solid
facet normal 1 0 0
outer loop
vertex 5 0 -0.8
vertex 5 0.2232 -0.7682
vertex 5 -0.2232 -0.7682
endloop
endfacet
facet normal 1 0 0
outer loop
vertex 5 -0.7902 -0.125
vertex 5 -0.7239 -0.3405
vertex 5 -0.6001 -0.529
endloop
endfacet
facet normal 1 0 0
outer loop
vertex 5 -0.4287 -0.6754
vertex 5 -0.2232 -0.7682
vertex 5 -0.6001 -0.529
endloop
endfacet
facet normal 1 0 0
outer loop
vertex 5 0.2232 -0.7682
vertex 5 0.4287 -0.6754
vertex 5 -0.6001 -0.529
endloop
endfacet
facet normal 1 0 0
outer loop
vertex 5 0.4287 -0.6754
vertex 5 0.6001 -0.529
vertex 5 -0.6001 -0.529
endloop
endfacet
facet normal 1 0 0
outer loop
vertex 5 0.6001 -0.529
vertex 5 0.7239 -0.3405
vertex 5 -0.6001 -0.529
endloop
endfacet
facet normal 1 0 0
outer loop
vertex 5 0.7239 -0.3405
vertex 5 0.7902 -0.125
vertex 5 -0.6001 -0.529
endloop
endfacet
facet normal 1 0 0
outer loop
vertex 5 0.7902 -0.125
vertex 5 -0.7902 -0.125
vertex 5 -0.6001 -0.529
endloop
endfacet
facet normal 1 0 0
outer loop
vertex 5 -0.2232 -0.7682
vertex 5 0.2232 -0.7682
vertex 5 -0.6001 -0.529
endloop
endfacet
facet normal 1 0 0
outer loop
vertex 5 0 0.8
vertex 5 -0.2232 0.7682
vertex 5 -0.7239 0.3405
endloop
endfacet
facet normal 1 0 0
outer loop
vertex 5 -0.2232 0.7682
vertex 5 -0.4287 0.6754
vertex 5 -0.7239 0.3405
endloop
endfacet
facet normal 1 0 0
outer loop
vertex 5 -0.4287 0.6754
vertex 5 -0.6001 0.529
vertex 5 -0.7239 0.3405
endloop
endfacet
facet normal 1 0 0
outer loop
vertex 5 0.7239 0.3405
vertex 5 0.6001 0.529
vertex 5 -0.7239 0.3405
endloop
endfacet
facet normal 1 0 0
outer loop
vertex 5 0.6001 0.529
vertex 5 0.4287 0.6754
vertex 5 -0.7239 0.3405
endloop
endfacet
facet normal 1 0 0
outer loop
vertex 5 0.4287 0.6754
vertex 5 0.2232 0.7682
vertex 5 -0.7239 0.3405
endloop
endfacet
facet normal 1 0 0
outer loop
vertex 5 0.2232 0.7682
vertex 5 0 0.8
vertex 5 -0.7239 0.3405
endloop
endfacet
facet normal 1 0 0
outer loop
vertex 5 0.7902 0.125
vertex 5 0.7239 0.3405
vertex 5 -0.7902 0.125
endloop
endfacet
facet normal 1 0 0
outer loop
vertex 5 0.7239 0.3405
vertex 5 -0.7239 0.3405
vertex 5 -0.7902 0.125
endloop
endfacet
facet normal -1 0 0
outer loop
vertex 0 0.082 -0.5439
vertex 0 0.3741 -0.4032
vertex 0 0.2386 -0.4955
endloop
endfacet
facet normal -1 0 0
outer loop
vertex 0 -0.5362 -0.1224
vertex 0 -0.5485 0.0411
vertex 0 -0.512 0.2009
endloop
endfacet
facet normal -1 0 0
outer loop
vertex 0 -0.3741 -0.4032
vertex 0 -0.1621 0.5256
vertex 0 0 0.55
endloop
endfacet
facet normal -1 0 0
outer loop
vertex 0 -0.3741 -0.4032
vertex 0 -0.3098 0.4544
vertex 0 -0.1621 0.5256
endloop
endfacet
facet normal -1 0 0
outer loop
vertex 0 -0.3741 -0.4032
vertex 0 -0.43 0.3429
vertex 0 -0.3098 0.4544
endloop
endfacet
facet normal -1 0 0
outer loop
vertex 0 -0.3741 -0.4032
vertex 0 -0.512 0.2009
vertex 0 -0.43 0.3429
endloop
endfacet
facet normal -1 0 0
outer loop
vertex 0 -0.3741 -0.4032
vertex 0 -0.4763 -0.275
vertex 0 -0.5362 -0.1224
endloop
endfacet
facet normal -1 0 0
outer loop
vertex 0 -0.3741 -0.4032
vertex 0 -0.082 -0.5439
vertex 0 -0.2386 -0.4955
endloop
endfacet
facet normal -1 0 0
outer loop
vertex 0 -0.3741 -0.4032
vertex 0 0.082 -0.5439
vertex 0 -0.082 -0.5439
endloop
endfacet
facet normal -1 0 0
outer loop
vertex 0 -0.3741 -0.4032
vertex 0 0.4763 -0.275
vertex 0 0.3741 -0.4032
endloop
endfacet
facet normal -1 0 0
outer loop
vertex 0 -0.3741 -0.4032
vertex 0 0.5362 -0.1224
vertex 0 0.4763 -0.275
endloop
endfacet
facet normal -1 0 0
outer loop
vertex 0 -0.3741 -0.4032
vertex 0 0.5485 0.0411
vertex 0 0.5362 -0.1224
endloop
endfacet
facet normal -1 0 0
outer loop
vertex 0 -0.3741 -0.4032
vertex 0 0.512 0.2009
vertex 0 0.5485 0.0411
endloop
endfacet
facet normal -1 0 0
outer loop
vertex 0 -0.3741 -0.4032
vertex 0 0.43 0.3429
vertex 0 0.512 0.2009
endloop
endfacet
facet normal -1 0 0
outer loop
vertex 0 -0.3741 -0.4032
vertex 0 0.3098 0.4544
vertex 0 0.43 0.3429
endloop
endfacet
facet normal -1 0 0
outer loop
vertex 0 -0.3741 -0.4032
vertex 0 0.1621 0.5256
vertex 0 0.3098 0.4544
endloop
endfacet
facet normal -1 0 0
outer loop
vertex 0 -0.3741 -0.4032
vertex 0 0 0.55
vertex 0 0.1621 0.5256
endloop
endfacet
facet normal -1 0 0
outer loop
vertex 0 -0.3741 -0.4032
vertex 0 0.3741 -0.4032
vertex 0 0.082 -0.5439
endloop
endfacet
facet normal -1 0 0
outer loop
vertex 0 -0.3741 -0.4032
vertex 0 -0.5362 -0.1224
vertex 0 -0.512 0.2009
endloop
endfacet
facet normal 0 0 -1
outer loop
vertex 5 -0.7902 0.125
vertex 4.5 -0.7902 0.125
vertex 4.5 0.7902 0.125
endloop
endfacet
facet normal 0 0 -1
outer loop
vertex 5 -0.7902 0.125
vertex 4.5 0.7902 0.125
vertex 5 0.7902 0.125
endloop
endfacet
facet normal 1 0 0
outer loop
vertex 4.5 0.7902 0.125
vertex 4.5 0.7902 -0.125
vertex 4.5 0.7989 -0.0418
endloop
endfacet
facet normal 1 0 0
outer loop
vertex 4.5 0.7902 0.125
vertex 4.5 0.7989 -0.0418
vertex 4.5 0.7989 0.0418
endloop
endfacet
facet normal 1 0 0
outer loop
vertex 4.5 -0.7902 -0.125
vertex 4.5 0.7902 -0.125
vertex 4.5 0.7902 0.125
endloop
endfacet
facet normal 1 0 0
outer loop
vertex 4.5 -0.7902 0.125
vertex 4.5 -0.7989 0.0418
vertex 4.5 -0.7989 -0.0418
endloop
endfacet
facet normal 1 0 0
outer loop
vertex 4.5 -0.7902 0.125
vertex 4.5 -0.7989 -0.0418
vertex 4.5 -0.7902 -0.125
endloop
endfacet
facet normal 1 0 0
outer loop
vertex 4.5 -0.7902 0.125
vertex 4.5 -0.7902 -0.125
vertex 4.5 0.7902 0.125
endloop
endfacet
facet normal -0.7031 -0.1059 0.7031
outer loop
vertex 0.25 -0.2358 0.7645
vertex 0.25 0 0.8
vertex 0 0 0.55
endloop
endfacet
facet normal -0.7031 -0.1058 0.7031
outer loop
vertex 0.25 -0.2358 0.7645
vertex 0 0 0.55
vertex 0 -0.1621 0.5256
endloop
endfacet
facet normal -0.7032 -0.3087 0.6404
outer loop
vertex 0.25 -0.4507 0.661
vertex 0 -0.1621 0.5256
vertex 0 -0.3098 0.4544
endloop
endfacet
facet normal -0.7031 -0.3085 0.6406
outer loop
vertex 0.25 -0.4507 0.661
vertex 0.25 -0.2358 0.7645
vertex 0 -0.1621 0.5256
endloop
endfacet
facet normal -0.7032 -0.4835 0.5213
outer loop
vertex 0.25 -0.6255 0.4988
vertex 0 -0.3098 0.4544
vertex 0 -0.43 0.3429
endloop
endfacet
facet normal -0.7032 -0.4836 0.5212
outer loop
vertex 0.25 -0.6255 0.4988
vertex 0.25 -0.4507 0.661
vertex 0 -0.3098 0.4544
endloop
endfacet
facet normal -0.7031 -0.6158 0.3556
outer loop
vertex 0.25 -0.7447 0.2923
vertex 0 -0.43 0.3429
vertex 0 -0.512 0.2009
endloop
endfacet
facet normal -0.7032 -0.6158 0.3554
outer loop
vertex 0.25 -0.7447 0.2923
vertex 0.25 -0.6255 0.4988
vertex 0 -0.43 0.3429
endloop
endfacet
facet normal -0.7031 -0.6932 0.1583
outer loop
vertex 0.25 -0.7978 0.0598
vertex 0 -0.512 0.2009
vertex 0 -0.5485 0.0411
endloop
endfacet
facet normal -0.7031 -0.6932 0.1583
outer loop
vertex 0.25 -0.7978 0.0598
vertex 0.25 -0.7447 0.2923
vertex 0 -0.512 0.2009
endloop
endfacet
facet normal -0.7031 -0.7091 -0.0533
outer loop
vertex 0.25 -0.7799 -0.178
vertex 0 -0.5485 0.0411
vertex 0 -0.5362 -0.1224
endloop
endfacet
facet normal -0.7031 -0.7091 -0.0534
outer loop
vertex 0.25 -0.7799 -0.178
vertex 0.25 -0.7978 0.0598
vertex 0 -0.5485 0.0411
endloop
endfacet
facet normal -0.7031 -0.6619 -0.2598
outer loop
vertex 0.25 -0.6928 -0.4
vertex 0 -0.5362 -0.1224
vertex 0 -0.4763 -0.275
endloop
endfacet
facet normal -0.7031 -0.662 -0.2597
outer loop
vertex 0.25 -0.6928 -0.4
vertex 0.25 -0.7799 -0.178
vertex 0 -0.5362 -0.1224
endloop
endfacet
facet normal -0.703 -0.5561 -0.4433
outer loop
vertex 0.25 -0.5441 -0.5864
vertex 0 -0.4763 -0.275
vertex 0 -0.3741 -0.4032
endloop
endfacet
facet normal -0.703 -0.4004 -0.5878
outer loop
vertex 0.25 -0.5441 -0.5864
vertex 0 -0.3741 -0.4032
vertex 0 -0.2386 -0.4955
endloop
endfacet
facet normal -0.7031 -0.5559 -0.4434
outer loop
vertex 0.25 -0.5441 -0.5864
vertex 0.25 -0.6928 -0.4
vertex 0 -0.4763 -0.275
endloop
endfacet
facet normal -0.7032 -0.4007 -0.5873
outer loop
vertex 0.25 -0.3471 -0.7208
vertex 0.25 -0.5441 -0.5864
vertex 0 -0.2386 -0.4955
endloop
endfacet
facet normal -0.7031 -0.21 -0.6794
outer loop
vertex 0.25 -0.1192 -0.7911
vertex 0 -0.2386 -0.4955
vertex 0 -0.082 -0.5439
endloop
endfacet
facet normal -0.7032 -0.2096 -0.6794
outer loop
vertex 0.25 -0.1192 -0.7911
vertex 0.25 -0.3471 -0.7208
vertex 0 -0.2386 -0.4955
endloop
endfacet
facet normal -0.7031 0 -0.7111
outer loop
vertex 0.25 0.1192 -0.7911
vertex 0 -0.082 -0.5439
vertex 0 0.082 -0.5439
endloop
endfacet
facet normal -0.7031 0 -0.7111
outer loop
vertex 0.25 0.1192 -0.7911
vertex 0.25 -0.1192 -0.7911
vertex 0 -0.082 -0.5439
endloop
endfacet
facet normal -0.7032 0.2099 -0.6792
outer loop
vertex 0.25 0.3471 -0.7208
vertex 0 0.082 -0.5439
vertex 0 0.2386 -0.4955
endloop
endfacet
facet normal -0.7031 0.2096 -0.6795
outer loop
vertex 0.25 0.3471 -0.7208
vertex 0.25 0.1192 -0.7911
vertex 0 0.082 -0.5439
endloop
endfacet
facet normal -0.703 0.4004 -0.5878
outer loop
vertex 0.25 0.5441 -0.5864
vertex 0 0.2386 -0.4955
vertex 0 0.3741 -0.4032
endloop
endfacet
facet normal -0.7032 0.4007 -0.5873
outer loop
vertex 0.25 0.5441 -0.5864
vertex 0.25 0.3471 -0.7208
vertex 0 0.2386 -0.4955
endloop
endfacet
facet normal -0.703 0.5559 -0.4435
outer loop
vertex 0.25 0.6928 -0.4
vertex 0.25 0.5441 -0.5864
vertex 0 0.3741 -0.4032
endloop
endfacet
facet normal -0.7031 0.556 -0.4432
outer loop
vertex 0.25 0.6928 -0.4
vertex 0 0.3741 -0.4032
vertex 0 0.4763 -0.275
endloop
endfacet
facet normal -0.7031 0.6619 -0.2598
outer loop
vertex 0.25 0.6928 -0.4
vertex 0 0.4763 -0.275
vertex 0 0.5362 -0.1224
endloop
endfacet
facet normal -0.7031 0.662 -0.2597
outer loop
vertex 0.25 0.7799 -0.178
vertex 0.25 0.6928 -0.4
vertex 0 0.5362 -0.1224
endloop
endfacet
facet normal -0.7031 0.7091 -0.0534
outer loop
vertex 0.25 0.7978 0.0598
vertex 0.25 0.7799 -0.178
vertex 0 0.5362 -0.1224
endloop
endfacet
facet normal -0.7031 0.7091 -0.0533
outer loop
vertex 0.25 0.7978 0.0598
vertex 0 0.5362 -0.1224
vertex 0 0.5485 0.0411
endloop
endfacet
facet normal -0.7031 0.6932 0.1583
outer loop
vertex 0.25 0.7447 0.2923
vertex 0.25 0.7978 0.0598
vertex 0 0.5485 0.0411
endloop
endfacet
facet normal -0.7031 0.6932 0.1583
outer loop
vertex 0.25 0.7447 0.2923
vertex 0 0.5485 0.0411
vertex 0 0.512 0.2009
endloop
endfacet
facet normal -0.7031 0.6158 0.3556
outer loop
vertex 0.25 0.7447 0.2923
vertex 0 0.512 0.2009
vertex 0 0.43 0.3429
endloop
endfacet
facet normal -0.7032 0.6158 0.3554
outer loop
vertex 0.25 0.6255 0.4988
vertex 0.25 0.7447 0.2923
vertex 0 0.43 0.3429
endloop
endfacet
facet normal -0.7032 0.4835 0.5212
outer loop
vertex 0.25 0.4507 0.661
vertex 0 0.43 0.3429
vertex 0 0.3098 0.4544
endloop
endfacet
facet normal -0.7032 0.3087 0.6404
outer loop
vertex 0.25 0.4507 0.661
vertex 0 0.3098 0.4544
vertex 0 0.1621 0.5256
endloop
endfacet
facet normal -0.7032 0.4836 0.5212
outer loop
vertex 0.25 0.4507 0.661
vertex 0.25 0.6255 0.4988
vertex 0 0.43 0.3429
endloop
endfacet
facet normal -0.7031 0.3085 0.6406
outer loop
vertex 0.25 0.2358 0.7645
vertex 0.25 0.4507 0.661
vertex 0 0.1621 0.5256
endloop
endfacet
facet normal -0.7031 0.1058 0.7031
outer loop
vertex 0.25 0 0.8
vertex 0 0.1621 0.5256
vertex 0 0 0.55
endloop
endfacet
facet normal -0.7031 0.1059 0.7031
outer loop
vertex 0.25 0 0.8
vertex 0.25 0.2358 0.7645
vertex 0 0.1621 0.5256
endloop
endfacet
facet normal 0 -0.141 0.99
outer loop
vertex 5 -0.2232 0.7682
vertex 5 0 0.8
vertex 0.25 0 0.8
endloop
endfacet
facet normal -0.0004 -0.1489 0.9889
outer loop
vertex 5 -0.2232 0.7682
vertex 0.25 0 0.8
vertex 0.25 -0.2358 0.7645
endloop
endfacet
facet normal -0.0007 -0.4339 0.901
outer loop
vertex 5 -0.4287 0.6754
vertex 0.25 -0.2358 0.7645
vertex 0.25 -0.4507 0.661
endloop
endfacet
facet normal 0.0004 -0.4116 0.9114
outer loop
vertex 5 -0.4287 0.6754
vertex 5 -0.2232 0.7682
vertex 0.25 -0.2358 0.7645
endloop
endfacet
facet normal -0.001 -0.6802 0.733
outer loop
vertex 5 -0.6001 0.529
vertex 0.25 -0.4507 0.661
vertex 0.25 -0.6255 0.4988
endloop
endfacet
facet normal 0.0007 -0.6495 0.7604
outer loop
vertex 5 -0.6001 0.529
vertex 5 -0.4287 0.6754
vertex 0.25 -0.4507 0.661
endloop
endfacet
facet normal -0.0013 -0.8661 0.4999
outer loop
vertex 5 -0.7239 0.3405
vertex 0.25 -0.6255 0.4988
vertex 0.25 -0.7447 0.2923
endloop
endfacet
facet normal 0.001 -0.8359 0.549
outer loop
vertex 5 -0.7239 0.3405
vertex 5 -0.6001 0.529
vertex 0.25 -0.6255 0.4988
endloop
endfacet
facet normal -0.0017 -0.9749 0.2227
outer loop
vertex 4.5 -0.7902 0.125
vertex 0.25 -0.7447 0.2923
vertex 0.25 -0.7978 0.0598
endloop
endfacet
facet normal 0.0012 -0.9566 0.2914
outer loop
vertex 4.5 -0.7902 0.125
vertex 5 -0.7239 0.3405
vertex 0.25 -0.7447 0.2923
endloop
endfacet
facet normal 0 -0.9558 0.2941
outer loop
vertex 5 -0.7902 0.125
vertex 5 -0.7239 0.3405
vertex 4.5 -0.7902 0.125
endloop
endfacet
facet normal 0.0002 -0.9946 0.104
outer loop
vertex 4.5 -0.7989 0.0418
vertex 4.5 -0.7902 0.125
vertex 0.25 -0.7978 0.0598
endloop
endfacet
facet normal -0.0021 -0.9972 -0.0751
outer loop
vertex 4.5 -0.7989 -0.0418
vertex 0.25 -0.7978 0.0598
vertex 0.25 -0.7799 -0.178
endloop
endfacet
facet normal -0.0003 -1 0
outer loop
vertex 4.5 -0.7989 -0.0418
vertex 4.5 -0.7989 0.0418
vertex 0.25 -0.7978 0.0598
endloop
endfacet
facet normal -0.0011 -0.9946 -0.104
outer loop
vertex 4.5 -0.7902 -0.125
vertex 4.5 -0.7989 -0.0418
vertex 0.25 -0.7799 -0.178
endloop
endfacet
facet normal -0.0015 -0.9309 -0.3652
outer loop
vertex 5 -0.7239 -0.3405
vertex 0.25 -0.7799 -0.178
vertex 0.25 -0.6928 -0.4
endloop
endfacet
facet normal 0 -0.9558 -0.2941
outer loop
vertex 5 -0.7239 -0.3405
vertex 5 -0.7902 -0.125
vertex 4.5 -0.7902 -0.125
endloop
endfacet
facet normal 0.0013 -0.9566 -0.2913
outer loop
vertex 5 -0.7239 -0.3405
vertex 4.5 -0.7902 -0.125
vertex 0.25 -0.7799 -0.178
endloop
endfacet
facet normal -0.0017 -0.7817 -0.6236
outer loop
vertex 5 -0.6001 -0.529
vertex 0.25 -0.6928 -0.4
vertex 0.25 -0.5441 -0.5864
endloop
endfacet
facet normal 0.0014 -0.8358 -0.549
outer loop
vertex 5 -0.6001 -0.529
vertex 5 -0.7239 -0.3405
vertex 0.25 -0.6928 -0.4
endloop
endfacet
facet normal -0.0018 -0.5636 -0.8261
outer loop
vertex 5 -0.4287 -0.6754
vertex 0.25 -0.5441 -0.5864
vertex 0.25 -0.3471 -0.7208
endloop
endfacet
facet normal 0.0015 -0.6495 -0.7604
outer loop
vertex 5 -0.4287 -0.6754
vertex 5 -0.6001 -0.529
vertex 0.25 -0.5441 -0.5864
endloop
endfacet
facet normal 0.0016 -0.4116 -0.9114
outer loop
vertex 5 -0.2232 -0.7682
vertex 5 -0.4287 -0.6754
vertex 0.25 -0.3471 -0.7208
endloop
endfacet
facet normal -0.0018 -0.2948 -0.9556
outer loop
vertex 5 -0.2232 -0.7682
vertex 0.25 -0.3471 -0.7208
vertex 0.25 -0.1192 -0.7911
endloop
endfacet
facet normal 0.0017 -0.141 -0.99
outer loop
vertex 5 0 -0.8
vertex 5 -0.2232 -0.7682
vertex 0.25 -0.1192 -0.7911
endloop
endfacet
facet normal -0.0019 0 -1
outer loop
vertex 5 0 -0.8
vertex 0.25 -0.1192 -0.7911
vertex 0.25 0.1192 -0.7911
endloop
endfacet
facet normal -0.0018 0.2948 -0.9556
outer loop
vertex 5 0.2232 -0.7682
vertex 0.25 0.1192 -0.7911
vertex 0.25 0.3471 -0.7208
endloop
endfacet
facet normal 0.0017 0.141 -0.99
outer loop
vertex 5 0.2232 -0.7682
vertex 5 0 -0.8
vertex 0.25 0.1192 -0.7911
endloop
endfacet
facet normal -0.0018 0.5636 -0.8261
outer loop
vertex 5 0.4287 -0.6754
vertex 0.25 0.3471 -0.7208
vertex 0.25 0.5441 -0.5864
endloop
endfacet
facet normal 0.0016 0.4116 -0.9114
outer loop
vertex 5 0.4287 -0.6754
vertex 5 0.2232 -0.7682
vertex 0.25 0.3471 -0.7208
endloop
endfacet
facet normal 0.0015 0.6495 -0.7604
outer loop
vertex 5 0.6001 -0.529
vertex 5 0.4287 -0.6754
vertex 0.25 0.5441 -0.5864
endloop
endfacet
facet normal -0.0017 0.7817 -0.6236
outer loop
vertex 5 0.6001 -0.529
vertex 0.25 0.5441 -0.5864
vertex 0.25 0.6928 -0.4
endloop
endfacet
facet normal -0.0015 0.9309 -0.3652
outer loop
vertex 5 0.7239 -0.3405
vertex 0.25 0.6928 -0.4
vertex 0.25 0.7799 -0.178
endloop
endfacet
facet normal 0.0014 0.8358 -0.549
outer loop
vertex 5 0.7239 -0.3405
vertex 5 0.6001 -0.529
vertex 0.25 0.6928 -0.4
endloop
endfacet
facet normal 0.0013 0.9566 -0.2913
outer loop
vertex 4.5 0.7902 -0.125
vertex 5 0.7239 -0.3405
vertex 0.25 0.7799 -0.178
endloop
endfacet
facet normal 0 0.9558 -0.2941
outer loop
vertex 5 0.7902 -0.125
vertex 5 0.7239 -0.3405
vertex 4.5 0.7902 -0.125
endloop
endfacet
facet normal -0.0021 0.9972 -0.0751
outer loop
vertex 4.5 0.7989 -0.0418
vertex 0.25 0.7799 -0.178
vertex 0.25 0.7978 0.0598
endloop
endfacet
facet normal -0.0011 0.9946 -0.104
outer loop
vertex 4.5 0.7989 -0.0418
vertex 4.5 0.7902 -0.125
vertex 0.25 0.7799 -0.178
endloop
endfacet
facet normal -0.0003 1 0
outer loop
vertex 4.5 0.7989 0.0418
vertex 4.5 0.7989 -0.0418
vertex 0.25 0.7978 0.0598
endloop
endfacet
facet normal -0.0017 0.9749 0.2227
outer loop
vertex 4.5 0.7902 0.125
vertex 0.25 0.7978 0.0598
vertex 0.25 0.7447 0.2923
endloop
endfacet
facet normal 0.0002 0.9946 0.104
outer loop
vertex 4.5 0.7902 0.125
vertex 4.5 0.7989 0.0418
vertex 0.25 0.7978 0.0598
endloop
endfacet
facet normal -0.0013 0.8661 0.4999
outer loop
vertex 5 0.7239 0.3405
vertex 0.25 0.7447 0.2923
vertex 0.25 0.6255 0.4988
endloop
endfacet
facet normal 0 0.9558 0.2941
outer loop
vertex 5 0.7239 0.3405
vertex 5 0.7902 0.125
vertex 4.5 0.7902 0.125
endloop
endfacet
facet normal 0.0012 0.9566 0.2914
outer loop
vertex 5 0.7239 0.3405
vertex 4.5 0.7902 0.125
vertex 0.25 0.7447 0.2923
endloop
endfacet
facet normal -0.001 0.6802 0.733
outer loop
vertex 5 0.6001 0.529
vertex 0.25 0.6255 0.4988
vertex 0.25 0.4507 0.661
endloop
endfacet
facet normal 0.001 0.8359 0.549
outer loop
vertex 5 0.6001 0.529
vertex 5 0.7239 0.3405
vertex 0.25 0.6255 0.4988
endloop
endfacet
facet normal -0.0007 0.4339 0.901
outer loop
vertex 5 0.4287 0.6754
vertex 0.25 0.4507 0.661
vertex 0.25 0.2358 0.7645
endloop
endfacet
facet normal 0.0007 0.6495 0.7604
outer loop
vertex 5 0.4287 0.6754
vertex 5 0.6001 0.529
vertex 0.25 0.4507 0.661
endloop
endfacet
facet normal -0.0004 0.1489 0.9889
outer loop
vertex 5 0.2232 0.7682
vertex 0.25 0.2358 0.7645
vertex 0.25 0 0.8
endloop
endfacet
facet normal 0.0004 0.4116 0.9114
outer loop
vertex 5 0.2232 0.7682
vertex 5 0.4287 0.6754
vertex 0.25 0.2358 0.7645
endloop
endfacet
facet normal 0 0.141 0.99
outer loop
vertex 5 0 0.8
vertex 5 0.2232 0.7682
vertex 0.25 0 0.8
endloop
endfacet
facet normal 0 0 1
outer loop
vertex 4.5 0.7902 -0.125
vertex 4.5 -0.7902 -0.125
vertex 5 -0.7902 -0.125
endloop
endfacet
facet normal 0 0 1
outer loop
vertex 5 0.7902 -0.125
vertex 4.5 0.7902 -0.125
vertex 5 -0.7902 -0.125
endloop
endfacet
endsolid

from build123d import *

# Parameters (mm, degrees)
F0_W     = 5
F0_H     = 0.8
F2_W     = 0.5
F2_H     = 0.25
F3_DEPTH = 12.5
F4_SIZE  = 0.25


with BuildPart() as f1:
    # F0 (on Front) → F1 (revolve)
    with BuildSketch(Plane.XZ):
        with Locations((2.5, 0.4)):
            Rectangle(F0_W, F0_H)
    revolve(axis=Axis((2.5, 0, 0), (1, 0, 0)))

    # F2 (on Front) → F3 (cut, symmetric)
    with BuildSketch(Plane.XZ):
        with Locations((4.75, 0)):
            Rectangle(F2_W, F2_H)
    extrude(amount=F3_DEPTH, both=True, mode=Mode.SUBTRACT)

    # F4
    f4_edges = [f1.edges().sort_by_distance(p)[0] for p in [
        (0, 0, -0.8),
    ]]
    chamfer(f4_edges, length=F4_SIZE)


solid = f1.part
